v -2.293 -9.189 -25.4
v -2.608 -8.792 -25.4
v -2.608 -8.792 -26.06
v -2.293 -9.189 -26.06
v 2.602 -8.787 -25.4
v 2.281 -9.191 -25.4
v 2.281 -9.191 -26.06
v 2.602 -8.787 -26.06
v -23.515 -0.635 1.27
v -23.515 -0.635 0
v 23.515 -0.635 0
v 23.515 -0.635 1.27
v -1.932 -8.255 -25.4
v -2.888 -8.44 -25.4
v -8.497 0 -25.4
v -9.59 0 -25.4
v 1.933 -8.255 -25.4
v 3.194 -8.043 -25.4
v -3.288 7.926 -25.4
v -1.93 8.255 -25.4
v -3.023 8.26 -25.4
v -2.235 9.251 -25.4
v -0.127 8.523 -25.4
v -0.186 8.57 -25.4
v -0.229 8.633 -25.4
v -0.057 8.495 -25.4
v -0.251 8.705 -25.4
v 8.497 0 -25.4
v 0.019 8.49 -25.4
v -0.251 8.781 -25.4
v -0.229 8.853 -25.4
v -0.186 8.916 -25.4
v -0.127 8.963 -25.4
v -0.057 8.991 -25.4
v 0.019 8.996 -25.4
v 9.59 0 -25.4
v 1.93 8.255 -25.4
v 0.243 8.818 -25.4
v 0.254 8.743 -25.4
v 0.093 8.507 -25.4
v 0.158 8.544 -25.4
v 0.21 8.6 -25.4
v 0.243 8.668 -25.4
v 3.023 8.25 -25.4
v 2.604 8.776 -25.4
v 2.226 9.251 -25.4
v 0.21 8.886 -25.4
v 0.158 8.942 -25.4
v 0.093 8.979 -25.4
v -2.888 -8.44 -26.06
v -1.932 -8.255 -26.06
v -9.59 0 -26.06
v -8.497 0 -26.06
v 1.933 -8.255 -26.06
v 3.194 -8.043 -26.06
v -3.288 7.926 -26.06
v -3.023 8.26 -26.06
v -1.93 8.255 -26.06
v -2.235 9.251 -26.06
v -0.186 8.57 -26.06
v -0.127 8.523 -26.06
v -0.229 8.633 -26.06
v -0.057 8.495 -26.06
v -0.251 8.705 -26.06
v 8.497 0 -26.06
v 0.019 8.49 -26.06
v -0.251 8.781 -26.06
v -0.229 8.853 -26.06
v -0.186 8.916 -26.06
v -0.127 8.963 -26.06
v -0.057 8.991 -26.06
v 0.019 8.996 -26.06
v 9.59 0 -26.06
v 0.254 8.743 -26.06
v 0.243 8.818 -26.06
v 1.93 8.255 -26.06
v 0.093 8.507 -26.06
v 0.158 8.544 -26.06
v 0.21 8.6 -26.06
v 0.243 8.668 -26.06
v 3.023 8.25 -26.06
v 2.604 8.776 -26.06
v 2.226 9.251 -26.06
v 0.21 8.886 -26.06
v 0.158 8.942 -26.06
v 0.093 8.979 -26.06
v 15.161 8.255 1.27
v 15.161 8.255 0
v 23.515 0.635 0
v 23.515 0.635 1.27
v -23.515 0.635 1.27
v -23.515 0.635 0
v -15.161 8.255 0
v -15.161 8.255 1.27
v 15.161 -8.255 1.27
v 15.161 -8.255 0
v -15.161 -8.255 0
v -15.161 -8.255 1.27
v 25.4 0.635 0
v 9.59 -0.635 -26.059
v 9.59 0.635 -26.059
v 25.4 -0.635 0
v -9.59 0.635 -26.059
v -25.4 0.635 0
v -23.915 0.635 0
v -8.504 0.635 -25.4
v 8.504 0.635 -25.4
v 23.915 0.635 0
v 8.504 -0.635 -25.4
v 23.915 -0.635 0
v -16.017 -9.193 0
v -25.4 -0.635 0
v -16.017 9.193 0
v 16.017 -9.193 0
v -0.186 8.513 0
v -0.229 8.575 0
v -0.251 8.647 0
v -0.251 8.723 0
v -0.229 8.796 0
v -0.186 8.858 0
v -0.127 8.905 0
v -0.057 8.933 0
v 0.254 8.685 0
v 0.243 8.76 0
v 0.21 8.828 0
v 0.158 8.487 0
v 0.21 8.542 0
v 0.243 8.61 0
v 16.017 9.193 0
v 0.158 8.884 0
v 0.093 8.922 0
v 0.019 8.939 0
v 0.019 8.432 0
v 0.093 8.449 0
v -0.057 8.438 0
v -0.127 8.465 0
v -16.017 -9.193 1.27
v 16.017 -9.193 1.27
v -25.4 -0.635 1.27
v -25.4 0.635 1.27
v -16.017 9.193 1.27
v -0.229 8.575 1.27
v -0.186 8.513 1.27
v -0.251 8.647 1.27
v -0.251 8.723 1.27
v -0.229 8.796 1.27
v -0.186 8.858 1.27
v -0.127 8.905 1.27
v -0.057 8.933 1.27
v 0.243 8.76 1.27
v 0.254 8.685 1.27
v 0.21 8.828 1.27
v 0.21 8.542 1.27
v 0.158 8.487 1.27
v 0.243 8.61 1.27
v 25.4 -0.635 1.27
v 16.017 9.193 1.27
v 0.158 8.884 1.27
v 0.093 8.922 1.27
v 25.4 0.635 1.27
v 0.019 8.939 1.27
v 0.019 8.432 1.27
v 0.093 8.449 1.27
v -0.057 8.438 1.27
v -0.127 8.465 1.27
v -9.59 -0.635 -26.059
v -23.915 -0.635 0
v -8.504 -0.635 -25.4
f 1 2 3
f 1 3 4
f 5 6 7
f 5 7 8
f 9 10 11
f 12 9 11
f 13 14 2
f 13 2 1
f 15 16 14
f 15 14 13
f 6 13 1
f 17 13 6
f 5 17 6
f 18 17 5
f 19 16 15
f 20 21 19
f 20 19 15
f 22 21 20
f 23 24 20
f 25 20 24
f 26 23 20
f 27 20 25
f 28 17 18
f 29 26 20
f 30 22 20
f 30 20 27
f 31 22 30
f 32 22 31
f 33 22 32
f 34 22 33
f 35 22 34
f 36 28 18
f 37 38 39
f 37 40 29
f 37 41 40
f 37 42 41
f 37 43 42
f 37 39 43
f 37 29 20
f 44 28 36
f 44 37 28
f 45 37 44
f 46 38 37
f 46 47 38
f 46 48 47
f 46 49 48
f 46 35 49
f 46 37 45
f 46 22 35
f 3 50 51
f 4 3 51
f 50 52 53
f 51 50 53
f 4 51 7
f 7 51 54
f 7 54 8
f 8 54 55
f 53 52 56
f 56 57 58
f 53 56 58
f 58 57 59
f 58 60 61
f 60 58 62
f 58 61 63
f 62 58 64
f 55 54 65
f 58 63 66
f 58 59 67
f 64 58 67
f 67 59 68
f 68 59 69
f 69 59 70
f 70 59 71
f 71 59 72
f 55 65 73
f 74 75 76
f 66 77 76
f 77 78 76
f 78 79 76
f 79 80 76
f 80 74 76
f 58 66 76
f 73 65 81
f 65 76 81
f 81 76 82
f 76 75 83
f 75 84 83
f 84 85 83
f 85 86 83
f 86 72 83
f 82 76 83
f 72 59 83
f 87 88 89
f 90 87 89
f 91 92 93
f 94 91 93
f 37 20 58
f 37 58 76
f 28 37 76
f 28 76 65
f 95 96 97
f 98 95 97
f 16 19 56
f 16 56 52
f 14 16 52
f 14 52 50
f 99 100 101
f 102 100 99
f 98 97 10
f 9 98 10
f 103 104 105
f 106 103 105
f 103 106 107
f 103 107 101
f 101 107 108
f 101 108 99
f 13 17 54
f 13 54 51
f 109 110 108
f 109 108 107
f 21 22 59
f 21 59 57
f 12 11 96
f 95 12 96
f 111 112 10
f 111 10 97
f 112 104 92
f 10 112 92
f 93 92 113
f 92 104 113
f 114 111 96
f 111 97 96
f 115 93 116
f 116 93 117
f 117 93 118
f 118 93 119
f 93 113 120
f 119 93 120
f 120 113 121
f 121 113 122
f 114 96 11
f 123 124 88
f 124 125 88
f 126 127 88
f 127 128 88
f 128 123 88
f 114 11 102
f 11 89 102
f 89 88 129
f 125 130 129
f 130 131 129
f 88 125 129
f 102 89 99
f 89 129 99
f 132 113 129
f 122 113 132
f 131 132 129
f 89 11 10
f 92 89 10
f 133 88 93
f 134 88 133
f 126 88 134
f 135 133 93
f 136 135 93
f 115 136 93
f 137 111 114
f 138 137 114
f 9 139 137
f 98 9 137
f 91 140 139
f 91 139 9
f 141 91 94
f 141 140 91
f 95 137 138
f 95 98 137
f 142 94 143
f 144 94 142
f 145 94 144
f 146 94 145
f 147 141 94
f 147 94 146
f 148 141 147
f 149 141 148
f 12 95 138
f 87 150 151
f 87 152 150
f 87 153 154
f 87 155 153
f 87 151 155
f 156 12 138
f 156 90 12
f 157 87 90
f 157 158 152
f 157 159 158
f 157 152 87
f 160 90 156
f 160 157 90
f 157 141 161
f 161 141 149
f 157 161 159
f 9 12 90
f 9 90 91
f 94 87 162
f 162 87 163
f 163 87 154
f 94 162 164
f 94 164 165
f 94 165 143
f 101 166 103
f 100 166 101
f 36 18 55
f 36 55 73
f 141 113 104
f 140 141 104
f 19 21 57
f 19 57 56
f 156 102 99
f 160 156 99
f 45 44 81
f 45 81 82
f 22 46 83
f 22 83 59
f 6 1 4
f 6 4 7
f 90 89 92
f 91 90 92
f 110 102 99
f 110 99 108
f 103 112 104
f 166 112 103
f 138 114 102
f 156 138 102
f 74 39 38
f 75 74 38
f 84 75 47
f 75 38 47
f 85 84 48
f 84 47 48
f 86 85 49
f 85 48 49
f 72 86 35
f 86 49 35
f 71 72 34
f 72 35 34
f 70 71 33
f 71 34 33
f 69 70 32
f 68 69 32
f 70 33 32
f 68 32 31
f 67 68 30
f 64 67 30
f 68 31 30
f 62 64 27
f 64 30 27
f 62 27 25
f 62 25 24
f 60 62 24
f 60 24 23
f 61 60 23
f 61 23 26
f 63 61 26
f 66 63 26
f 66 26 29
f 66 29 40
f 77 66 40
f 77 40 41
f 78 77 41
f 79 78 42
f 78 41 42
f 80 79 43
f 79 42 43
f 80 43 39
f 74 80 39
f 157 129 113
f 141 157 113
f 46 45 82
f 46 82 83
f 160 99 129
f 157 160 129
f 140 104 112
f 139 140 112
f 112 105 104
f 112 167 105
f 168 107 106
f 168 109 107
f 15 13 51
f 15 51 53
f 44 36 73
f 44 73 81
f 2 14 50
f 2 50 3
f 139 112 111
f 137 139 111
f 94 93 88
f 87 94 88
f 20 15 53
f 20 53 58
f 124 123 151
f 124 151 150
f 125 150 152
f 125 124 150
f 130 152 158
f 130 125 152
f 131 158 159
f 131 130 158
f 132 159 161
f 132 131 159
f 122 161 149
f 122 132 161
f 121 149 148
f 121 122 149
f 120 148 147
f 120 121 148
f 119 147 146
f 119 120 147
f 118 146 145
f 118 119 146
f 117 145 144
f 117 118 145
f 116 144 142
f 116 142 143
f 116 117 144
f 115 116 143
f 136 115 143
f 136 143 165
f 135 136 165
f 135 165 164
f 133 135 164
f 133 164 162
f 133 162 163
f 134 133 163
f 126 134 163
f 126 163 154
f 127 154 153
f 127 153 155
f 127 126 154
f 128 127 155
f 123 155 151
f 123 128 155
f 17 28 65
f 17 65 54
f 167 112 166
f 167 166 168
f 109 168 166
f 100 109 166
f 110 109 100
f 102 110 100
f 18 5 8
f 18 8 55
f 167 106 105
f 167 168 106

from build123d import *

# Parameters (mm, degrees)
F0_R     = 0.254
F1_DEPTH = 1.27
F3_DEPTH = 0.635
F5_R     = 0.254
F6_DEPTH = 0.6604


with BuildPart() as f1:
    # F0 (on Top) → F1 (new body)
    with BuildSketch(Plane.XY):
        Polygon((16.016765, -9.193323), (25.4, -0.635), (25.4, 0.635), (16.016765, 9.193323), (-16.016765, 9.193323), (-25.4, 0.635), (-25.4, -0.635), (-16.016765, -9.193323), align=None)
        Polygon((-23.515402, -0.635), (23.515402, -0.635), (15.160933, -8.255), (-15.160933, -8.255), align=None, mode=Mode.SUBTRACT)
        Polygon((15.160933, 8.255), (23.515402, 0.635), (-23.515402, 0.635), (-15.160933, 8.255), align=None, mode=Mode.SUBTRACT)
        with Locations((0, 8.685323)):
            Circle(F0_R, mode=Mode.SUBTRACT)
    extrude(amount=F1_DEPTH)


with BuildPart() as f3:
    # F2 (on Front) → F3 (new body, symmetric)
    with BuildSketch(Plane.XZ):
        Polygon((-23.914527, 0), (-25.4, 0), (-9.589531, -26.05877), (9.589531, -26.05877), (25.4, 0), (23.914527, 0), (8.503749, -25.4), (-8.503749, -25.4), align=None)
    extrude(amount=F3_DEPTH, both=True)


with BuildPart() as f6:
    # F5 (on offset) → F6 (new body)
    with BuildSketch(Plane.XY.offset(-25.4)):
        Polygon((3.193676, -8.042787), (9.589531, 0), (3.022589, 8.250195), (2.604311, 8.775687), (2.225999, 9.250969), (-0.687336, 9.250969), (-2.23486, 9.250969), (-3.022588, 8.260137), (-3.288361, 7.925837), (-9.589531, 0), (-2.887769, -8.439773), (-2.608047, -8.792037), (-2.293075, -9.188693), (2.280778, -9.190756), (2.601799, -8.787072), align=None)
        Polygon((1.9304, 8.255), (8.497331, 0), (1.932718, -8.255), (-1.931736, -8.255), (-8.497331, 0), (-1.9304, 8.255), align=None, mode=Mode.SUBTRACT)
        with Locations((0, 8.742969)):
            Circle(F5_R, mode=Mode.SUBTRACT)
    extrude(amount=-F6_DEPTH)


solid = Compound([f1.part, f3.part, f6.part])
